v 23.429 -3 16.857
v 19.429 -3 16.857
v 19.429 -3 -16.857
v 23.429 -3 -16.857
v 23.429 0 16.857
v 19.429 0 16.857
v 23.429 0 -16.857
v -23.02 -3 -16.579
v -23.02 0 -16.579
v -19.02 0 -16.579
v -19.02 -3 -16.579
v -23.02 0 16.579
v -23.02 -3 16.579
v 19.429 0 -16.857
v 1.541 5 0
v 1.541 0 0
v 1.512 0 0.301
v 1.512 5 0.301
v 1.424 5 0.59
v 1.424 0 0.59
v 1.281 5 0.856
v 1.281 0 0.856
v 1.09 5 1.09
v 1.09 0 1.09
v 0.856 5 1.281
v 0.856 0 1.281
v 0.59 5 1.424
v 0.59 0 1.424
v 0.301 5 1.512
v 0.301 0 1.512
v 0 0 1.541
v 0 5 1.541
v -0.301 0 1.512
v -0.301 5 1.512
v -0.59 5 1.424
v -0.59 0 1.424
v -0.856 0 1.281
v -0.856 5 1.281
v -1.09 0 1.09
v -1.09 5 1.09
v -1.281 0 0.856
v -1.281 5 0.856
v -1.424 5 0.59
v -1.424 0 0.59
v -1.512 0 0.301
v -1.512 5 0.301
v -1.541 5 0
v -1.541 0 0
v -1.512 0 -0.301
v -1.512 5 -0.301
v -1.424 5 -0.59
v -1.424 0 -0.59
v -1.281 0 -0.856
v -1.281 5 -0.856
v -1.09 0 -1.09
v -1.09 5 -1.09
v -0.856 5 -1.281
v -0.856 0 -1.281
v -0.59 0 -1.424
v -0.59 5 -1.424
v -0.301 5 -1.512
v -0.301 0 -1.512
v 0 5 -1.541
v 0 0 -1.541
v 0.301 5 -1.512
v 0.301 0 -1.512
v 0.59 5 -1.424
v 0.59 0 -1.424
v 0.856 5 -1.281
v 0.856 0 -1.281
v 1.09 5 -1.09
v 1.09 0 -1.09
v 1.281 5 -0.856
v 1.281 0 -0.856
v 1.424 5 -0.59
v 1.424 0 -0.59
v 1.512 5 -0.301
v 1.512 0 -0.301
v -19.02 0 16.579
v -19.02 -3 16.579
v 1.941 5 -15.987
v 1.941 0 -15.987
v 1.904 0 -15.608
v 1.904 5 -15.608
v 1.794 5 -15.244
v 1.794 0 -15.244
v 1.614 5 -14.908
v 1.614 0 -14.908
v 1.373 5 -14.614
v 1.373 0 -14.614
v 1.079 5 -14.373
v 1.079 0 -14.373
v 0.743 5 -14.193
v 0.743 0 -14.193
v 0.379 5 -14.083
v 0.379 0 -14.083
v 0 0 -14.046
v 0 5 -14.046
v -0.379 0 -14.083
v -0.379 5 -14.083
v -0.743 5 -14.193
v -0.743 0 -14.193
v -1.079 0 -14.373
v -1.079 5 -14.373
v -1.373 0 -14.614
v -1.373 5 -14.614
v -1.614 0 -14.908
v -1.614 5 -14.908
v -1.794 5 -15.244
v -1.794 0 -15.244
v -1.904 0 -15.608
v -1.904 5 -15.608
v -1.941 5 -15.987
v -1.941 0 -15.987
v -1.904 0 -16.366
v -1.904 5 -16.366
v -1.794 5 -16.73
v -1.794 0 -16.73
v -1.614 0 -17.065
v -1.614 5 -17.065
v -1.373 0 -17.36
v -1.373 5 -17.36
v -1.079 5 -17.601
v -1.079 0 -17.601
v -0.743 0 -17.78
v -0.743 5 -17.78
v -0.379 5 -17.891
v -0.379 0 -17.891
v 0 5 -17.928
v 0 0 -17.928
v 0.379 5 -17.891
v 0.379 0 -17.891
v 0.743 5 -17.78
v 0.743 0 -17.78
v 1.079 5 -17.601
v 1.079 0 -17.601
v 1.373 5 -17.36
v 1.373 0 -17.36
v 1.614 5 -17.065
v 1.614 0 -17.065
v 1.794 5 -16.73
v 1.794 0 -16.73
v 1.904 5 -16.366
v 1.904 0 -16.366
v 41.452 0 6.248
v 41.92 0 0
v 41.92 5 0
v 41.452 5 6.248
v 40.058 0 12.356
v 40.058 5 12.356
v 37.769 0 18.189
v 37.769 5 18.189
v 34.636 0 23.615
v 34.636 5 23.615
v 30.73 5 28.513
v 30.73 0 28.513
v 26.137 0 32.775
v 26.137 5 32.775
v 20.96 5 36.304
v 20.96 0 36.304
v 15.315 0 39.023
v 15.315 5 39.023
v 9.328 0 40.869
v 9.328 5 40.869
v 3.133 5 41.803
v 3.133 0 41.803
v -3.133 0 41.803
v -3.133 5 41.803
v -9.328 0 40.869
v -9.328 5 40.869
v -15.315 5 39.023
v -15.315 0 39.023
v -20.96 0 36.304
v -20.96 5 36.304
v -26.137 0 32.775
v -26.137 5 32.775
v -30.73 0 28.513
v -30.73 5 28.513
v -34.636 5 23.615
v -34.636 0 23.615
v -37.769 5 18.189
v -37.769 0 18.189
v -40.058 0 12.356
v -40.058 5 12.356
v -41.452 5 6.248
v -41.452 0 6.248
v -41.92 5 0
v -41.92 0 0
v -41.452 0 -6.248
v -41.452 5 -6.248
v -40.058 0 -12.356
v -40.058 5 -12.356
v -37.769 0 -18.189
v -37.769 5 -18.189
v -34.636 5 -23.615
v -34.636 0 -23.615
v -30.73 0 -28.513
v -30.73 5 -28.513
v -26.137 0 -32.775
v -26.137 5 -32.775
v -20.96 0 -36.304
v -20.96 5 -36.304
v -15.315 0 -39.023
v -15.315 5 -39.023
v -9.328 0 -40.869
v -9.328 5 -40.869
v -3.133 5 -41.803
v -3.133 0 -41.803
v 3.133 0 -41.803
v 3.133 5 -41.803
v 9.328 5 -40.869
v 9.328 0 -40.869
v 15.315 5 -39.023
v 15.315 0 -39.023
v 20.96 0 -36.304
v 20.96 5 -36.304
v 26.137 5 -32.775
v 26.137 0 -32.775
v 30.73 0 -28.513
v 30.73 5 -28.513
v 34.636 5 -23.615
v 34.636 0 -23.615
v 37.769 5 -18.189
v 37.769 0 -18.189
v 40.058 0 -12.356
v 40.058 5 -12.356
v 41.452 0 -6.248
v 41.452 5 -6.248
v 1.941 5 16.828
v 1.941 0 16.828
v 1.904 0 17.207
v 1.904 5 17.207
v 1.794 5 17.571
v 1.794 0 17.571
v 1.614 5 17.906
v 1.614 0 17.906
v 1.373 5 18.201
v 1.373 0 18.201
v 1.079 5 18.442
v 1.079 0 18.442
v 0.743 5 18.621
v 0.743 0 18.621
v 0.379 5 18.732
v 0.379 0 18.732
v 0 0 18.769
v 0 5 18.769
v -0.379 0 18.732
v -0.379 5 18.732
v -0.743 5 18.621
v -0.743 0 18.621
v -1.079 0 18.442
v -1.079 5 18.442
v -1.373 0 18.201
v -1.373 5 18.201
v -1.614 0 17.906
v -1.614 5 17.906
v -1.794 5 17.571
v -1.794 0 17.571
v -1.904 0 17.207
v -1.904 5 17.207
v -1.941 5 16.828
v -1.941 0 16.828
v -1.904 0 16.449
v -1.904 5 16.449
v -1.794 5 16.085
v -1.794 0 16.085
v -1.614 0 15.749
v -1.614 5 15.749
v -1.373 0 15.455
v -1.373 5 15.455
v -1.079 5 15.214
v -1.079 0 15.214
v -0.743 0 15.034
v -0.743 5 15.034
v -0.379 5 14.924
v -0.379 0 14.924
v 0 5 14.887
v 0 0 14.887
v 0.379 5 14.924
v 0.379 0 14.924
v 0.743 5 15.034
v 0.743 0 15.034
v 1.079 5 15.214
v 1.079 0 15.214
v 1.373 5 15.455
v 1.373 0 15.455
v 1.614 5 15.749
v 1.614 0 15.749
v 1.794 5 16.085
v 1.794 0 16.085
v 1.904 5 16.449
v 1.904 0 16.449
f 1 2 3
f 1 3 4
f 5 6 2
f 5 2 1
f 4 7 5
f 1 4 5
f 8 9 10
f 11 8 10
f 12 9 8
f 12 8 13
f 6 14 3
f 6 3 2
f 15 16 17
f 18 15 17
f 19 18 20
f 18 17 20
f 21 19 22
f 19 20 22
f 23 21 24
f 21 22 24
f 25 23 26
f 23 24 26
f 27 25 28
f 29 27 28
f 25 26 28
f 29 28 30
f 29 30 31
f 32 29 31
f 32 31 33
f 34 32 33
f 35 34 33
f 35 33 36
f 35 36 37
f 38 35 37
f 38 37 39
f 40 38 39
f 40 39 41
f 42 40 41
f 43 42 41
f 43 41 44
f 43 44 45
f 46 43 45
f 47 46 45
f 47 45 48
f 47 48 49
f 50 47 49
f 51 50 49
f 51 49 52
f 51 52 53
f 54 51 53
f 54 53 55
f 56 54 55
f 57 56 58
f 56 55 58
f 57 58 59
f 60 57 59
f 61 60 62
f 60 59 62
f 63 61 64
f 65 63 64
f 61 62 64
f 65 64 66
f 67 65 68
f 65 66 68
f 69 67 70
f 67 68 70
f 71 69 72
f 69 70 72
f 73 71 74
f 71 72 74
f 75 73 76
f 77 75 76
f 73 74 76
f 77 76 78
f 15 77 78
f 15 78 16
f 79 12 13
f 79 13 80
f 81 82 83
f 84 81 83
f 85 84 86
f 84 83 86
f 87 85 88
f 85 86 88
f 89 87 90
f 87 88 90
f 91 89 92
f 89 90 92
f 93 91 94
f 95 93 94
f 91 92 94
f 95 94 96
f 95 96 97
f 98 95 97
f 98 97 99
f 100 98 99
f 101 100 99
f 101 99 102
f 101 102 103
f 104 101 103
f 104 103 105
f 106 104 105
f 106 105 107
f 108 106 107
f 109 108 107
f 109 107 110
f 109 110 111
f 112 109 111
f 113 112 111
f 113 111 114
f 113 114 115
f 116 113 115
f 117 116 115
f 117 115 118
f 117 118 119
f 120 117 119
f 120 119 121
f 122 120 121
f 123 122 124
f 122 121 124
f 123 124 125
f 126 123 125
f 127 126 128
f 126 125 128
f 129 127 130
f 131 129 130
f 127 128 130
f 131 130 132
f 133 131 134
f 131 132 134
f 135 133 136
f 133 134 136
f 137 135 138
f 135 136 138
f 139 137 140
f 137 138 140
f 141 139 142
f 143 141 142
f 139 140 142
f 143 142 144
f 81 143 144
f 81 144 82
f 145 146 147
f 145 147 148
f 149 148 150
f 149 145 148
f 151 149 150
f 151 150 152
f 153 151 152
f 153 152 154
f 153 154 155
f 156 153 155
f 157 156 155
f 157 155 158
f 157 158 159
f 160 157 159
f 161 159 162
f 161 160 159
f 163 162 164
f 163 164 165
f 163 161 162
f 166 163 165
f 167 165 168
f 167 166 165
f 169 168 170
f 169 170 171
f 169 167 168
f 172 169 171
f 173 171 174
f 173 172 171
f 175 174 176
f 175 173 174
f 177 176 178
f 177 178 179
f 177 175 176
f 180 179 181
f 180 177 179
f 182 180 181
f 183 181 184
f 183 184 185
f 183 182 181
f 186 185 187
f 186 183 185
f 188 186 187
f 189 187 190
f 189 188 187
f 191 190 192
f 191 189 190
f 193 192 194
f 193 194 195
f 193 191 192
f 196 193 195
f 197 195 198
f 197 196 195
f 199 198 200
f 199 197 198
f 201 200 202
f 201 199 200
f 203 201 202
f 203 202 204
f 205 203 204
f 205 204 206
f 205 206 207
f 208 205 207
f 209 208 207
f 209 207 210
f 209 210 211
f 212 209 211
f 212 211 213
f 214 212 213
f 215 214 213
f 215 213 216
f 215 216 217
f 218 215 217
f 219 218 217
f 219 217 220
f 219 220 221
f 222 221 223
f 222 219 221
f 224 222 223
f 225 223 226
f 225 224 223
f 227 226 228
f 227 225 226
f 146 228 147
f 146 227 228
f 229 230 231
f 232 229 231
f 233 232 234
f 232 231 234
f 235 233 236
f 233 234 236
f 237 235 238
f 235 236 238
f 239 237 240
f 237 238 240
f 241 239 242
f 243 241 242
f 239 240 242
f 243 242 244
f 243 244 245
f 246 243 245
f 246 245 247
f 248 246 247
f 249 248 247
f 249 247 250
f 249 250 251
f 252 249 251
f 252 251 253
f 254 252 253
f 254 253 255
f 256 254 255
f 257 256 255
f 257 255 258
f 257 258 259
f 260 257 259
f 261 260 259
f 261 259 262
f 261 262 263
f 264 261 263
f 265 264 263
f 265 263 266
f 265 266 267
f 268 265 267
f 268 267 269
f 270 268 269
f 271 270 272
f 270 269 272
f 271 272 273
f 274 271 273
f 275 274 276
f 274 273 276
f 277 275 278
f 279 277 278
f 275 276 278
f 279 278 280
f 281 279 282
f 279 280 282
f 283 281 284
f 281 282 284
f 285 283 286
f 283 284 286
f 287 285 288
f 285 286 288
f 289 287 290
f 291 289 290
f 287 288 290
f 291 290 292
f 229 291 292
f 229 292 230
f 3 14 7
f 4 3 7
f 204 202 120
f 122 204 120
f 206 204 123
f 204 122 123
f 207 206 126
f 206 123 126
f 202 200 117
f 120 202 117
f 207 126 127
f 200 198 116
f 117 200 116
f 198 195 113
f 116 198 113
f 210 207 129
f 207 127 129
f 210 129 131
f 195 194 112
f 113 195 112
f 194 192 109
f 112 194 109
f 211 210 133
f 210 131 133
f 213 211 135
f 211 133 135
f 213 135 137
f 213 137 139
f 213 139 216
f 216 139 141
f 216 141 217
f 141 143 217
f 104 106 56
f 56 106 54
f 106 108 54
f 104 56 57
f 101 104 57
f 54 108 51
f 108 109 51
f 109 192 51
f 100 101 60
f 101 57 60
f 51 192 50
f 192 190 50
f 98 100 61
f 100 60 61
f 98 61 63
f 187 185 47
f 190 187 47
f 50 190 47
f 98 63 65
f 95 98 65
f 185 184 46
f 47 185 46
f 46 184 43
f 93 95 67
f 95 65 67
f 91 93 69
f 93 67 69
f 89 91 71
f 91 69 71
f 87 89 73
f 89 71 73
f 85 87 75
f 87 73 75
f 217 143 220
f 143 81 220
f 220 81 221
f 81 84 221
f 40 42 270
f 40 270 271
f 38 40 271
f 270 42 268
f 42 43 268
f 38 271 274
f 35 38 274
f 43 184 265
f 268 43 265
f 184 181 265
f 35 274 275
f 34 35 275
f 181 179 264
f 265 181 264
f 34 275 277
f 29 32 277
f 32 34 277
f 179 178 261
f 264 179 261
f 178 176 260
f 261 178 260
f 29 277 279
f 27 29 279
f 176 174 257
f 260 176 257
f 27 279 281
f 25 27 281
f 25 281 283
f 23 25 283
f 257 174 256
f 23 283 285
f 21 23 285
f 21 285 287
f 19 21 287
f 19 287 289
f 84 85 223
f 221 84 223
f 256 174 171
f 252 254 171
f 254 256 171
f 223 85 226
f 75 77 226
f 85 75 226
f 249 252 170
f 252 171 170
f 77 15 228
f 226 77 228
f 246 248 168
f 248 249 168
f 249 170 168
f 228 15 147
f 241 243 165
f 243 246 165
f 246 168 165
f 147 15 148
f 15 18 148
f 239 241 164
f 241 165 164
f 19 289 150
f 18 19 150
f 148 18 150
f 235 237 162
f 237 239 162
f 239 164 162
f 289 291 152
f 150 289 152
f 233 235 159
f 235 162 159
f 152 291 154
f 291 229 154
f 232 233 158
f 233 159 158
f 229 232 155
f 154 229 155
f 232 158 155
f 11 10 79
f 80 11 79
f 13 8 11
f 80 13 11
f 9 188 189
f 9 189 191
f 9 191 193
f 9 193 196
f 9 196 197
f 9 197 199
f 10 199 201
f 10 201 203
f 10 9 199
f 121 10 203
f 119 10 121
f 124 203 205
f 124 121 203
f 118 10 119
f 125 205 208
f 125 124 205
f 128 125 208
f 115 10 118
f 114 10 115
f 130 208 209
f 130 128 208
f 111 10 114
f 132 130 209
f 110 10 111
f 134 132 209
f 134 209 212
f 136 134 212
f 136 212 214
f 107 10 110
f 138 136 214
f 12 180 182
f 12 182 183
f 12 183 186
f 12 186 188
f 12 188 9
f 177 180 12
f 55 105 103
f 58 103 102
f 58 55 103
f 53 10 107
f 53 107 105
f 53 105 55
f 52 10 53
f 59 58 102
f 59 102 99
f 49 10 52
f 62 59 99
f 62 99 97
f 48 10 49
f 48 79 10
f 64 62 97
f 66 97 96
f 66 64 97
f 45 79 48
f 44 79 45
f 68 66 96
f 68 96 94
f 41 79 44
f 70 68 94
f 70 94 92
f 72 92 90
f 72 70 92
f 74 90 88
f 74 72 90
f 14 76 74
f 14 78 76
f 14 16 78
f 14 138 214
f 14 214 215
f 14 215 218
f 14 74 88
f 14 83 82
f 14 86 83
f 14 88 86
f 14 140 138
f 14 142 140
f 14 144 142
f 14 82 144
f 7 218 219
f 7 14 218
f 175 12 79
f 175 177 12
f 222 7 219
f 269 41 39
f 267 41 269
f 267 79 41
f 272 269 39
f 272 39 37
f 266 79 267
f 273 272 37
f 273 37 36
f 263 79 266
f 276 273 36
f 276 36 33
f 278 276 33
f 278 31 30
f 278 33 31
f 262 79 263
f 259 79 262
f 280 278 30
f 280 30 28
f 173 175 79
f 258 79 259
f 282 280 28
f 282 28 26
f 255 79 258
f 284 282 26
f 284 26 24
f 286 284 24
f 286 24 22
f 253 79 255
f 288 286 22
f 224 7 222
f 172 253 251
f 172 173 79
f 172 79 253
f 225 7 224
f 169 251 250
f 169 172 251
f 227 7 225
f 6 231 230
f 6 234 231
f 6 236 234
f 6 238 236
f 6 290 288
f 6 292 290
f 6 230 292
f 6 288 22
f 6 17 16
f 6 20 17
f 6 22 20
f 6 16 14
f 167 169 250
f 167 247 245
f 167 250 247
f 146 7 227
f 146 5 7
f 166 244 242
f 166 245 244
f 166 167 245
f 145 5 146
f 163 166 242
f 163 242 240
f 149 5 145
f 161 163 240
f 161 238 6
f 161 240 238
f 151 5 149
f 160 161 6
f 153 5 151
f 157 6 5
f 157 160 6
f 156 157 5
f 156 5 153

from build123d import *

# Parameters (mm, degrees)
F0_R     = 41.920471
F1_DEPTH = 5
F2_R     = 1.941315
F2_R_2   = 1.541244
F3_DEPTH = 50.7
F4_W     = 4
F4_H     = 33.157896
F4_H_2   = 33.714296
F6_DEPTH = 3


with BuildPart() as f1:
    # F0 (on Front) → F1 (new body)
    with BuildSketch(Plane.XZ):
        Circle(F0_R)
    extrude(amount=-F1_DEPTH)

    # F2 (on Front) → F3 (cut)
    with BuildSketch(Plane.XZ):
        with Locations((0, 16.827898)):
            Circle(F2_R)
        with Locations((0, -15.986843)):
            Circle(F2_R)
        Circle(F2_R_2)
    extrude(amount=-F3_DEPTH, mode=Mode.SUBTRACT)

    # F4 (on Front) → F6 (join)
    with BuildSketch(Plane.XZ):
        with Locations((-21.019738, 0)):
            Rectangle(F4_W, F4_H)
        with Locations((21.428579, 0)):
            Rectangle(F4_W, F4_H_2)
    extrude(amount=F6_DEPTH)


solid = f1.part
